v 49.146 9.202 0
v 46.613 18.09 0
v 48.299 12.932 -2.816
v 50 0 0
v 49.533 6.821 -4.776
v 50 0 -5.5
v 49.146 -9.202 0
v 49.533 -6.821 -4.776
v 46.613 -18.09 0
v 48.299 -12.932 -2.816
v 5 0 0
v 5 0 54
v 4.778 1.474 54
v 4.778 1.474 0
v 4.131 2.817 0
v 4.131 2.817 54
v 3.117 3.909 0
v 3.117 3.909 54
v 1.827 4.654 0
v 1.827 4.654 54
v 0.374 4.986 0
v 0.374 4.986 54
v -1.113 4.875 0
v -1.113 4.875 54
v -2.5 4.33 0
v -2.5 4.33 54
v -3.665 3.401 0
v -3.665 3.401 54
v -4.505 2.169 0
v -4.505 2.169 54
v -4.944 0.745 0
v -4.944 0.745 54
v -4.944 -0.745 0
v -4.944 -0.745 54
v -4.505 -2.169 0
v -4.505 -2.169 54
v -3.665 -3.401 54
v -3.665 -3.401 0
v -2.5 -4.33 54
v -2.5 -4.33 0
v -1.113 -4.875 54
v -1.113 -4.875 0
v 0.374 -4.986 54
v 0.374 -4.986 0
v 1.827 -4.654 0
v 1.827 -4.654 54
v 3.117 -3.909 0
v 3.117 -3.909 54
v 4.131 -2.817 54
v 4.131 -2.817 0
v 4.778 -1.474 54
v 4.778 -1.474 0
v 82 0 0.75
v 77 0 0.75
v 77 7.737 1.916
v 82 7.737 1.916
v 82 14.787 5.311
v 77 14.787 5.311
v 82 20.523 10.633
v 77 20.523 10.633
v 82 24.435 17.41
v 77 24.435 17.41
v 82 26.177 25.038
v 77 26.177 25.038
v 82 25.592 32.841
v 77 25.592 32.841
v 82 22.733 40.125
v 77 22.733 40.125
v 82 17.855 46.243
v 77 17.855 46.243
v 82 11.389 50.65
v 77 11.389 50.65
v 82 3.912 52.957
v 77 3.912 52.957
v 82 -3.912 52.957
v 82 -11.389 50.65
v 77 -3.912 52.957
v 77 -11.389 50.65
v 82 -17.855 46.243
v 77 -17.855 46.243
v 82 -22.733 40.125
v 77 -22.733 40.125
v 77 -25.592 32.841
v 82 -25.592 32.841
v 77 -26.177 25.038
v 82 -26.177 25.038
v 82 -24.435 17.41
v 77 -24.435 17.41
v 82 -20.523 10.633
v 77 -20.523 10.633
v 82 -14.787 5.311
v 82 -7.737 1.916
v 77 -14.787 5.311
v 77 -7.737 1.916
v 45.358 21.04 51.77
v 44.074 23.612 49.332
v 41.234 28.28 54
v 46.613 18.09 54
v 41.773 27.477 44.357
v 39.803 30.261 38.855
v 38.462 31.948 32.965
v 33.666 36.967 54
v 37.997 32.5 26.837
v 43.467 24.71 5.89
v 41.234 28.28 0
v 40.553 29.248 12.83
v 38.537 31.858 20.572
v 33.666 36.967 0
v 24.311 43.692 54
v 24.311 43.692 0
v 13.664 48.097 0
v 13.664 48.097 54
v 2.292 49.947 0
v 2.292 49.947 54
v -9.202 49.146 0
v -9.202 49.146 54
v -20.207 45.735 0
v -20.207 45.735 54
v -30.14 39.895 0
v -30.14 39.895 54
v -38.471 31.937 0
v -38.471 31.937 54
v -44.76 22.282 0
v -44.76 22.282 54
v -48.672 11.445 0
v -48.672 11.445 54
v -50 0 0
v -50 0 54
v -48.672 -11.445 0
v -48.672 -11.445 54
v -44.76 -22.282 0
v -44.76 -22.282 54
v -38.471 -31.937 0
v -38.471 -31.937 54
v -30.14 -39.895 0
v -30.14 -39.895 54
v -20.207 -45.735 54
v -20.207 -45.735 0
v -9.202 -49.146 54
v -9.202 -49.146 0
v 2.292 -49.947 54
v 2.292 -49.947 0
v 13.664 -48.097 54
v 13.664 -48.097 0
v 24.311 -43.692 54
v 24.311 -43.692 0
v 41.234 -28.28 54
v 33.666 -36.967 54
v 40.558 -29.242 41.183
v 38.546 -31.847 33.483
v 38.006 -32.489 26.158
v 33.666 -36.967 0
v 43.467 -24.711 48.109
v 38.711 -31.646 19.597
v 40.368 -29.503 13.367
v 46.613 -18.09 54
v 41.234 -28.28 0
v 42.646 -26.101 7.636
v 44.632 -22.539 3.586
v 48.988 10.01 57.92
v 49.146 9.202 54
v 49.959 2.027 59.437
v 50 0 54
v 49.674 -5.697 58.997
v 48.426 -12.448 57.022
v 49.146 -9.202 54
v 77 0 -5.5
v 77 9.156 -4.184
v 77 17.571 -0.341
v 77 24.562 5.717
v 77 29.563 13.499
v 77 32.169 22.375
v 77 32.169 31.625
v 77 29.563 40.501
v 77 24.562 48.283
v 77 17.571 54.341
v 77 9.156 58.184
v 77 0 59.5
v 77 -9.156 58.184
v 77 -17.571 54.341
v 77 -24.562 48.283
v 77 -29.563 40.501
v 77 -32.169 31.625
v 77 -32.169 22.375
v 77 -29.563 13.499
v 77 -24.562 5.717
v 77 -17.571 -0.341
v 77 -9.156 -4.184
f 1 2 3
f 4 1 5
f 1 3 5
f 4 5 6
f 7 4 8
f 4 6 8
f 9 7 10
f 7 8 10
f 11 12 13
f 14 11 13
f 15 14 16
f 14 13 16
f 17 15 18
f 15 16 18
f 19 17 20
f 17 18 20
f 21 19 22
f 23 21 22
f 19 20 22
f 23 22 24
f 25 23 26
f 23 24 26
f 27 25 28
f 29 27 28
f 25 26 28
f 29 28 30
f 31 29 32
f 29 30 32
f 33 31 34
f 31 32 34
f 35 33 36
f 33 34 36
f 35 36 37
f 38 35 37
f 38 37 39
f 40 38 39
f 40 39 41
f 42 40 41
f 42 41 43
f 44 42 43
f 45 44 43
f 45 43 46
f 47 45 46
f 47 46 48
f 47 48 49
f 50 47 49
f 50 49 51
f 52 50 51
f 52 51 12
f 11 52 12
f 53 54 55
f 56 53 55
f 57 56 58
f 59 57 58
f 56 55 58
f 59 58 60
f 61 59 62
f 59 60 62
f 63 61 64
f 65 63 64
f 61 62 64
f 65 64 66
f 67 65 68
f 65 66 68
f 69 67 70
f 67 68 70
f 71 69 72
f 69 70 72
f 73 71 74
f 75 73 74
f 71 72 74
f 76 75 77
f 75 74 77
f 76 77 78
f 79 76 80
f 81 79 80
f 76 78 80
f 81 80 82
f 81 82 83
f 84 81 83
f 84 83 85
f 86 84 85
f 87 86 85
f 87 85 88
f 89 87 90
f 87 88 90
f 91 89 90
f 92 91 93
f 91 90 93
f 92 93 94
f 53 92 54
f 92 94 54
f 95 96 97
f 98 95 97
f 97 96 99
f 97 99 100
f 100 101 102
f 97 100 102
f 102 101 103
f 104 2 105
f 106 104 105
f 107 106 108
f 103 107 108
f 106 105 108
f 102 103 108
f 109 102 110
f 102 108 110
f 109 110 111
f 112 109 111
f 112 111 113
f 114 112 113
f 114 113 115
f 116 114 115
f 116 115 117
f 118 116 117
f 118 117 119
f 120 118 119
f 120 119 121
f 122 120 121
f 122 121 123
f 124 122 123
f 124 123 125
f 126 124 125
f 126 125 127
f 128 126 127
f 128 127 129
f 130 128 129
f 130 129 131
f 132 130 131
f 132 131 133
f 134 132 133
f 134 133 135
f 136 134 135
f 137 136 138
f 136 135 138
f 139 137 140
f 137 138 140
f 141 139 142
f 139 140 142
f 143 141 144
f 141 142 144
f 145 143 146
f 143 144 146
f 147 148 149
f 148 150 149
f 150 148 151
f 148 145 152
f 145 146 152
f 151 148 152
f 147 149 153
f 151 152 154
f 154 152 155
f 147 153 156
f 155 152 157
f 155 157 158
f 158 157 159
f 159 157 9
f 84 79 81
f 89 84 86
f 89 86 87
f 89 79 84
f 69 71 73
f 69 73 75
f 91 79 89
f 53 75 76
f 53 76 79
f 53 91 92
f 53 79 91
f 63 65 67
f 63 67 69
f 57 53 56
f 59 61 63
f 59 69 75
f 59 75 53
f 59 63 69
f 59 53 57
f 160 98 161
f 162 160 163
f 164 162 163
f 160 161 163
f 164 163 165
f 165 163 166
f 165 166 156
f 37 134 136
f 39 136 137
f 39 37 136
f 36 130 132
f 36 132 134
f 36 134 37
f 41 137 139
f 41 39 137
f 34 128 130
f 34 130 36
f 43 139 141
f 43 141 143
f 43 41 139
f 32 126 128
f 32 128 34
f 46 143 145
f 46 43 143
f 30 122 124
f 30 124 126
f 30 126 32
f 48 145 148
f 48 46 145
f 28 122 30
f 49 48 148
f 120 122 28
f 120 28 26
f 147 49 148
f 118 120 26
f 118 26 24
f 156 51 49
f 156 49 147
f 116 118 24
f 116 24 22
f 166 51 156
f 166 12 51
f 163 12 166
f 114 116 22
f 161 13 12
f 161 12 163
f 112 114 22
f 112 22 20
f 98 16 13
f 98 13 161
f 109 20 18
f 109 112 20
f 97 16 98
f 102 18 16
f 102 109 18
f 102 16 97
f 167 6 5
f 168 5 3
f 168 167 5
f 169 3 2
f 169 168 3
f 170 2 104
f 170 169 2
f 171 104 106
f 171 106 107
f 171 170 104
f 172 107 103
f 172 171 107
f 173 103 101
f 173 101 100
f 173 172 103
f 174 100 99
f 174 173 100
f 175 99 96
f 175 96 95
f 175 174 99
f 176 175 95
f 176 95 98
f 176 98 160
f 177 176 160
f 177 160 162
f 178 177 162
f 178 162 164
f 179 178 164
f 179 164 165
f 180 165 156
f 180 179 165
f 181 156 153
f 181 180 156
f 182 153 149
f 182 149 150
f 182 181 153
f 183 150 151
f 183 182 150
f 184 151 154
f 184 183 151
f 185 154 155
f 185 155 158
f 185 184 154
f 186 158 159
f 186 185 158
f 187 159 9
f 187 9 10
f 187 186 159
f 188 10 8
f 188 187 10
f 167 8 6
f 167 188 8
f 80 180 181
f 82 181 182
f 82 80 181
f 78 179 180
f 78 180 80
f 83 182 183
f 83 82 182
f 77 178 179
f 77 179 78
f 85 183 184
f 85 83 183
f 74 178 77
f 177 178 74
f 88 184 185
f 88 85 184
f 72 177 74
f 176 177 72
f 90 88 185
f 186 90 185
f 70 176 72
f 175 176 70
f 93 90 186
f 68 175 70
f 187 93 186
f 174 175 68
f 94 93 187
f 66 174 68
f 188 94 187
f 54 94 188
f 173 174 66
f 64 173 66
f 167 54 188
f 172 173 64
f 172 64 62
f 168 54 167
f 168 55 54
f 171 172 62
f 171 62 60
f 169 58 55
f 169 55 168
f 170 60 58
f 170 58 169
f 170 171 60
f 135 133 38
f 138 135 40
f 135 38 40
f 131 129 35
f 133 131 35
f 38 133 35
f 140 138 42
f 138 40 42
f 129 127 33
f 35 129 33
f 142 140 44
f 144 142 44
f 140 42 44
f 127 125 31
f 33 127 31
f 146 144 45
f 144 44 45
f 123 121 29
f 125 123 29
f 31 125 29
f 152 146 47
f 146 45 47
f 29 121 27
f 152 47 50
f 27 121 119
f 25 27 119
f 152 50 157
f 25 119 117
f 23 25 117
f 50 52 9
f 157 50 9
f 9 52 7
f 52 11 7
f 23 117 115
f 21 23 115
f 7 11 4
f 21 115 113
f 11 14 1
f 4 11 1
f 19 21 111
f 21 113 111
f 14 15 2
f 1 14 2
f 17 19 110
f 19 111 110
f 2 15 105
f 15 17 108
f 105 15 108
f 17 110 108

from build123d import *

# Parameters (mm, degrees)
SKETCH1_R                = 50
BOSS_EXTRUDE1_DEPTH      = 54
BOSS_EXTRUDE2_REACH      = 148.782
BOSS_EXTRUDE2_END_RADIUS = 50
SKETCH3_R                = 32.5
SKETCH4_R                = 26.25
BOSS_EXTRUDE3_DEPTH      = 5
SKETCH5_R                = 5
CUT_EXTRUDE1_DEPTH       = 500


with BuildPart() as part:
    # Sketch1 → Boss-Extrude1 (new body)
    with BuildSketch(Plane.XY):
        Circle(SKETCH1_R)
    extrude(amount=BOSS_EXTRUDE1_DEPTH)

    # Boss-Extrude2: up to this cylinder (the profile starts outside it)
    boss_extrude2_end = Plane(origin=(0, 0, 27), z_dir=(0, 0, -1)) * Cylinder(BOSS_EXTRUDE2_END_RADIUS, 398.564, mode=Mode.PRIVATE)
    # Sketch3 → Boss-Extrude2 (add, up to the surface)
    with BuildSketch(Plane(origin=(77, 0, 0), x_dir=(0, 0, -1), z_dir=(1, 0, 0)), mode=Mode.PRIVATE) as boss_extrude2_sk1:
        with Locations((-27, 0)):
            Circle(SKETCH3_R)
    boss_extrude2_tool1 = extrude(boss_extrude2_sk1.sketch, amount=-BOSS_EXTRUDE2_REACH, mode=Mode.PRIVATE) - boss_extrude2_end
    add(boss_extrude2_tool1.solids().sort_by_distance((77, 0, 27))[0])

    # Sketch4 → Boss-Extrude3 (add)
    with BuildSketch(Plane(origin=(77, 0, 0), x_dir=(0, 0, -1), z_dir=(1, 0, 0))):
        with Locations((-27, 0)):
            Circle(SKETCH4_R)
    extrude(amount=BOSS_EXTRUDE3_DEPTH)

    # Sketch5 → Cut-Extrude1 (cut)
    with BuildSketch(Plane.XY.offset(54)):
        Circle(SKETCH5_R)
    extrude(amount=-CUT_EXTRUDE1_DEPTH, mode=Mode.SUBTRACT)


solid = part.part
